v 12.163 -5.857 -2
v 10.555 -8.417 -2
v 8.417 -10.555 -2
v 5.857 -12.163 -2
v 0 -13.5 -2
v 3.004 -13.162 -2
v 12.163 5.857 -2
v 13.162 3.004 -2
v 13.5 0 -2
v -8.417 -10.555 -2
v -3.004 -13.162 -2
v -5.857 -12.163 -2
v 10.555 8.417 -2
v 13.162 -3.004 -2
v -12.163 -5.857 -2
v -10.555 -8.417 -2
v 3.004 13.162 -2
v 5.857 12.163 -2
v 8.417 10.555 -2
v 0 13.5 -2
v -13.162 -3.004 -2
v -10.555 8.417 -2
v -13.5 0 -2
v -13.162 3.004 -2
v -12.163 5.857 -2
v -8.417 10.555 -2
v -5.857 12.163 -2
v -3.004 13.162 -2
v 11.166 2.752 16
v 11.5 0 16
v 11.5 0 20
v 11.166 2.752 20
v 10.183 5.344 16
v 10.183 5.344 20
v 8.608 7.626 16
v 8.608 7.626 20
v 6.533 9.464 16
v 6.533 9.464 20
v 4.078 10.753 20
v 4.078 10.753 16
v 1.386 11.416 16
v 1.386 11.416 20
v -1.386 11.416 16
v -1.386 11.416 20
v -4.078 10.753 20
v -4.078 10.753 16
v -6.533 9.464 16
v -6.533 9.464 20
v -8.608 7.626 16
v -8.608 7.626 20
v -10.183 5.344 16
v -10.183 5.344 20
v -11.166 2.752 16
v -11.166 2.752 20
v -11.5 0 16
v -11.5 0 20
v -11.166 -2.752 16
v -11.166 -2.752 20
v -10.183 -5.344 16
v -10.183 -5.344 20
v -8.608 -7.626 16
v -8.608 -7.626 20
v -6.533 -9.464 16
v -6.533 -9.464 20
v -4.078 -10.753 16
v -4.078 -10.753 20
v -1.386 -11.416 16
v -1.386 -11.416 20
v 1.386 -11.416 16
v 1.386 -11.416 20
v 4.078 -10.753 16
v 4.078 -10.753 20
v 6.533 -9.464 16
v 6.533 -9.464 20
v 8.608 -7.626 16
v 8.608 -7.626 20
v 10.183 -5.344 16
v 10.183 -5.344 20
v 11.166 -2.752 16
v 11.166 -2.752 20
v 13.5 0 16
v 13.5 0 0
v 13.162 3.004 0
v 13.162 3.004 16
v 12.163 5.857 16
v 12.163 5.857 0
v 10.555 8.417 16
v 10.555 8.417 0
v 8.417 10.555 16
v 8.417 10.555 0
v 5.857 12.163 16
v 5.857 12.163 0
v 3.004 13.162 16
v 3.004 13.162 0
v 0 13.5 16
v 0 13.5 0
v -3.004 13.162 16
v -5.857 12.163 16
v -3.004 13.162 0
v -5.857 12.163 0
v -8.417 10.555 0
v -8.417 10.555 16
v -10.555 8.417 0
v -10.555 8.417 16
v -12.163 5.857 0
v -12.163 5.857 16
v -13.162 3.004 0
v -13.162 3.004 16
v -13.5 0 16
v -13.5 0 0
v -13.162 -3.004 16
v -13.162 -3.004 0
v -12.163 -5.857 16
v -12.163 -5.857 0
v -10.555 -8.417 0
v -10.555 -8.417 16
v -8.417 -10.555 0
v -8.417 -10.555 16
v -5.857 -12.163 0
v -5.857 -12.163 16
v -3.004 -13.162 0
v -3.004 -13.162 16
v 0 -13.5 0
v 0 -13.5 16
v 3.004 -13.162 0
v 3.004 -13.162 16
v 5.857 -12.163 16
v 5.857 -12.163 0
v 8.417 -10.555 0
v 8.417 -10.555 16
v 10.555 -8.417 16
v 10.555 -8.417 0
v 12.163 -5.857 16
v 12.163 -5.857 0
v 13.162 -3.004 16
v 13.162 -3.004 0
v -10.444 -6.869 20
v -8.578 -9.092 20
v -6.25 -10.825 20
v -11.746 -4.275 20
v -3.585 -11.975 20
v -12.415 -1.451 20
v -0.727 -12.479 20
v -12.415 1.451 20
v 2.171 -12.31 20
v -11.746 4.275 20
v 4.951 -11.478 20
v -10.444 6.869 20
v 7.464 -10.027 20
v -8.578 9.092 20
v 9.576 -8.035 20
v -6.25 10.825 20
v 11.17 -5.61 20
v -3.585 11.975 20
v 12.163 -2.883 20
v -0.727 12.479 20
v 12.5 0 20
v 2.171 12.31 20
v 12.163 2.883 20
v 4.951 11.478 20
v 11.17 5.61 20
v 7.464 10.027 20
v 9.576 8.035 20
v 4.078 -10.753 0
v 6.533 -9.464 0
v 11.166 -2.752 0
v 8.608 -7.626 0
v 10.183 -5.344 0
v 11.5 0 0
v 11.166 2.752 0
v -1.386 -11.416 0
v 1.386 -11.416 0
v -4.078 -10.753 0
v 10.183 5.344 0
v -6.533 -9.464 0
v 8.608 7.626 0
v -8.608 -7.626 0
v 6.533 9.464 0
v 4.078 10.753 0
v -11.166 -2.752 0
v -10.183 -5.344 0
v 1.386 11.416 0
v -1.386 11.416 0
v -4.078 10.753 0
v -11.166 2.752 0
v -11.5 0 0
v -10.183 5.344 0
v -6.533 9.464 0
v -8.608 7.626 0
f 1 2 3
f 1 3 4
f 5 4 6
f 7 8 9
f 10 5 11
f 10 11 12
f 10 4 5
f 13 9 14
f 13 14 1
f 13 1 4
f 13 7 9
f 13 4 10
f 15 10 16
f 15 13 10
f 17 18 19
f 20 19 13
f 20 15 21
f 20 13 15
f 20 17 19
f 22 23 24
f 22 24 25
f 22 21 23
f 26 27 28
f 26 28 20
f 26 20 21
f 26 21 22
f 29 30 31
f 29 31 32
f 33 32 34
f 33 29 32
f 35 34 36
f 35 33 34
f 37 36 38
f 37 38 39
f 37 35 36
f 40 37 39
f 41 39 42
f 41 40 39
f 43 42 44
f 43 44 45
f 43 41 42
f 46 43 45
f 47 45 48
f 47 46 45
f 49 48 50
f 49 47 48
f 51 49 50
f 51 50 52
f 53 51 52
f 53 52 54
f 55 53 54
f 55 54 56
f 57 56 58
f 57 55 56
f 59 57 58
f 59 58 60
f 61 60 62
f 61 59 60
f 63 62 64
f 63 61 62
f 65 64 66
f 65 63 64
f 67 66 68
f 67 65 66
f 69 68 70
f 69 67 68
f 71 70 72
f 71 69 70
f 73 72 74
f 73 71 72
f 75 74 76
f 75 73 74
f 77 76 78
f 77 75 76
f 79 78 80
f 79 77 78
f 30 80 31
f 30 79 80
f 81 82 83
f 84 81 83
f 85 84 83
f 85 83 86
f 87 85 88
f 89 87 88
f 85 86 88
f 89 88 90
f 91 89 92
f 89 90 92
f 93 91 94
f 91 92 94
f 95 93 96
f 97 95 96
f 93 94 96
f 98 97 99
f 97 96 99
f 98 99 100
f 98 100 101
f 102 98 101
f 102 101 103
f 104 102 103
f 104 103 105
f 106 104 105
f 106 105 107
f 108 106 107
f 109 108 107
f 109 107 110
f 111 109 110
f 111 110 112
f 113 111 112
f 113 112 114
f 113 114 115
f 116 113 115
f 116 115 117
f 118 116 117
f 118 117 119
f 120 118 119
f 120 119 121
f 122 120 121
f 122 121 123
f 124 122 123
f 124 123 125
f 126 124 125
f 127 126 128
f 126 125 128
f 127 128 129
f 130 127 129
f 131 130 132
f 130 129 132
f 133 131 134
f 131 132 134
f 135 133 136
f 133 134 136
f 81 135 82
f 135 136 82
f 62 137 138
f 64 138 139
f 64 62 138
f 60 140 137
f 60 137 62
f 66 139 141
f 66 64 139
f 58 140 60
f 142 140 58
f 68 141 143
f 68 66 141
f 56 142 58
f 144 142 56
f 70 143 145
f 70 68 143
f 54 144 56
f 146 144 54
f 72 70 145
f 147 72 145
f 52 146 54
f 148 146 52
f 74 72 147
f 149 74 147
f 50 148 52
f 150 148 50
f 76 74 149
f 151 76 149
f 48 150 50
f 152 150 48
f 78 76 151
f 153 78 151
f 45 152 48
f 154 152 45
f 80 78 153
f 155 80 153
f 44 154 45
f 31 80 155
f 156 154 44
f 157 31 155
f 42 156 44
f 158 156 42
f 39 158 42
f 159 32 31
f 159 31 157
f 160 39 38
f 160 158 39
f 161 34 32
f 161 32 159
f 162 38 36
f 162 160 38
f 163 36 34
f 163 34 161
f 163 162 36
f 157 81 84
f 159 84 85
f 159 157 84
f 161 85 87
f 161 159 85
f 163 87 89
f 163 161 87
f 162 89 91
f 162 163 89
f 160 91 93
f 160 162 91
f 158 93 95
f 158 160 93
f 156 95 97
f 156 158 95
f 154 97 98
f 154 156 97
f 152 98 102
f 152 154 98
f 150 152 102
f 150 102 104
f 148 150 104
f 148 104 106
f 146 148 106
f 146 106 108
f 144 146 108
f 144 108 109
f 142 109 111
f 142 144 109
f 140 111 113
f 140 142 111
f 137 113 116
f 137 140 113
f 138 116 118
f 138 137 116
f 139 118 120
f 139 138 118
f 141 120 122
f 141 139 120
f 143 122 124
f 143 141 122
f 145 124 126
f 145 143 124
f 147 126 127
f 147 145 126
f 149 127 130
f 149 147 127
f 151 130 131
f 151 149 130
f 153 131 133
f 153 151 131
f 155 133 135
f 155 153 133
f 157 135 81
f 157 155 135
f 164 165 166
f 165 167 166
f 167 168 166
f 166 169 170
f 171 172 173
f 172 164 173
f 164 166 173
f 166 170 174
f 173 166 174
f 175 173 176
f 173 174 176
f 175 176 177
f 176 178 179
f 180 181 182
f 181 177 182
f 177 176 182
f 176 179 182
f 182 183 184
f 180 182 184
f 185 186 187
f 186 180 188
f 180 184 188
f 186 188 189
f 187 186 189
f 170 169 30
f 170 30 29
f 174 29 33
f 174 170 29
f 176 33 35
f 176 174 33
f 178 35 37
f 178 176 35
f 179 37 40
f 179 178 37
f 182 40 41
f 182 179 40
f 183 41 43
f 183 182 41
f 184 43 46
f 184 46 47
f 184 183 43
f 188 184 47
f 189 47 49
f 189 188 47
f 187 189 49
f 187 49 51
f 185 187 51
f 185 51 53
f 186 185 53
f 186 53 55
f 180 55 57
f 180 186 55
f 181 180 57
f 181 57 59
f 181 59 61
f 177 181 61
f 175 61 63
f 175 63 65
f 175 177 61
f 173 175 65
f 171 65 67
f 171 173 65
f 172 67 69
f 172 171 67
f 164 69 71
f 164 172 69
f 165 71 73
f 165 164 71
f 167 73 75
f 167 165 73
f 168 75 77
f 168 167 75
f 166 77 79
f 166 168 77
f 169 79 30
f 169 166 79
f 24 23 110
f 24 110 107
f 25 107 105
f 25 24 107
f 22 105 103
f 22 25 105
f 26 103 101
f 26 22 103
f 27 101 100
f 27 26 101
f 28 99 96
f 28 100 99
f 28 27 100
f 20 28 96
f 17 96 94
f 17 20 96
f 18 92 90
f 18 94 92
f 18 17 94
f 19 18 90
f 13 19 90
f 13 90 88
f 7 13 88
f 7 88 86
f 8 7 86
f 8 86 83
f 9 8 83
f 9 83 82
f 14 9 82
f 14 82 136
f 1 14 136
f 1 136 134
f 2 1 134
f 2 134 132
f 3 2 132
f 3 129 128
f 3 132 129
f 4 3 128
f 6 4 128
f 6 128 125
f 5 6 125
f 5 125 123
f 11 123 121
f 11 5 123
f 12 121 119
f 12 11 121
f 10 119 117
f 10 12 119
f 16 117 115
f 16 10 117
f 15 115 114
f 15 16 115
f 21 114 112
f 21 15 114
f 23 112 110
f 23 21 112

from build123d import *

# Parameters (mm, degrees)
SKETCH1_R           = 13.5
SKETCH1_R_2         = 11.5
EXTRUDE_THIN2_DEPTH = 16
BOSS_EXTRUDE1_START = 2
SKETCH2_R           = 13.5
BOSS_EXTRUDE1_DEPTH = 2
SKETCH3_R           = 12.5
SKETCH3_R_2         = 11.5
EXTRUDE_THIN3_DEPTH = 4
CHAMFER1_SIZE       = 1
CHAMFER1_SIZE_2     = 4


with BuildPart() as part:
    # Sketch1 → Extrude-Thin2 (new body)
    with BuildSketch(Plane.XY):
        Circle(SKETCH1_R)
        Circle(SKETCH1_R_2, mode=Mode.SUBTRACT)
    extrude(amount=EXTRUDE_THIN2_DEPTH)

    # Sketch2 → Boss-Extrude1 (add)
    with BuildSketch(Plane(origin=(0, 0, 0), x_dir=(-1, 0, 0), z_dir=(0, 0, -1)).offset(BOSS_EXTRUDE1_START)):
        Circle(SKETCH2_R)
    extrude(amount=-BOSS_EXTRUDE1_DEPTH)

    # Sketch3 → Extrude-Thin3 (add)
    with BuildSketch(Plane.XY.offset(16)):
        Circle(SKETCH3_R)
        Circle(SKETCH3_R_2, mode=Mode.SUBTRACT)
    extrude(amount=EXTRUDE_THIN3_DEPTH)

    # Chamfer1
    # the kernel refuses this chamfer: 4, 1 mm, written as the material it adds along each edge
    with BuildSketch(Plane(origin=(0, 0, 16), x_dir=(1, 0, 0), z_dir=(0, -1, 0))) as chamfer1_piece_1_section:
        Polygon((12.5 + CHAMFER1_SIZE, 0), (12.5, CHAMFER1_SIZE_2), (12.5, 0), align=None)
    chamfer1_piece_1 = revolve(axis=Axis((0, 0, 16), (0, 0, 1)), mode=Mode.PRIVATE)
    chamfer1_piece_1 = chamfer1_piece_1 & Plane(origin=(0, 0, 17.985898728), x_dir=(1, 0, 0), z_dir=(0, 0, -1)) * Cylinder(13.5, 54, mode=Mode.PRIVATE)
    chamfer1_piece_1 = split(chamfer1_piece_1, bisect_by=Plane(origin=(-12.943594911, 0, 20), z_dir=(0, 0, -1)), keep=Keep.TOP, mode=Mode.PRIVATE)
    add(chamfer1_piece_1)


solid = part.part
